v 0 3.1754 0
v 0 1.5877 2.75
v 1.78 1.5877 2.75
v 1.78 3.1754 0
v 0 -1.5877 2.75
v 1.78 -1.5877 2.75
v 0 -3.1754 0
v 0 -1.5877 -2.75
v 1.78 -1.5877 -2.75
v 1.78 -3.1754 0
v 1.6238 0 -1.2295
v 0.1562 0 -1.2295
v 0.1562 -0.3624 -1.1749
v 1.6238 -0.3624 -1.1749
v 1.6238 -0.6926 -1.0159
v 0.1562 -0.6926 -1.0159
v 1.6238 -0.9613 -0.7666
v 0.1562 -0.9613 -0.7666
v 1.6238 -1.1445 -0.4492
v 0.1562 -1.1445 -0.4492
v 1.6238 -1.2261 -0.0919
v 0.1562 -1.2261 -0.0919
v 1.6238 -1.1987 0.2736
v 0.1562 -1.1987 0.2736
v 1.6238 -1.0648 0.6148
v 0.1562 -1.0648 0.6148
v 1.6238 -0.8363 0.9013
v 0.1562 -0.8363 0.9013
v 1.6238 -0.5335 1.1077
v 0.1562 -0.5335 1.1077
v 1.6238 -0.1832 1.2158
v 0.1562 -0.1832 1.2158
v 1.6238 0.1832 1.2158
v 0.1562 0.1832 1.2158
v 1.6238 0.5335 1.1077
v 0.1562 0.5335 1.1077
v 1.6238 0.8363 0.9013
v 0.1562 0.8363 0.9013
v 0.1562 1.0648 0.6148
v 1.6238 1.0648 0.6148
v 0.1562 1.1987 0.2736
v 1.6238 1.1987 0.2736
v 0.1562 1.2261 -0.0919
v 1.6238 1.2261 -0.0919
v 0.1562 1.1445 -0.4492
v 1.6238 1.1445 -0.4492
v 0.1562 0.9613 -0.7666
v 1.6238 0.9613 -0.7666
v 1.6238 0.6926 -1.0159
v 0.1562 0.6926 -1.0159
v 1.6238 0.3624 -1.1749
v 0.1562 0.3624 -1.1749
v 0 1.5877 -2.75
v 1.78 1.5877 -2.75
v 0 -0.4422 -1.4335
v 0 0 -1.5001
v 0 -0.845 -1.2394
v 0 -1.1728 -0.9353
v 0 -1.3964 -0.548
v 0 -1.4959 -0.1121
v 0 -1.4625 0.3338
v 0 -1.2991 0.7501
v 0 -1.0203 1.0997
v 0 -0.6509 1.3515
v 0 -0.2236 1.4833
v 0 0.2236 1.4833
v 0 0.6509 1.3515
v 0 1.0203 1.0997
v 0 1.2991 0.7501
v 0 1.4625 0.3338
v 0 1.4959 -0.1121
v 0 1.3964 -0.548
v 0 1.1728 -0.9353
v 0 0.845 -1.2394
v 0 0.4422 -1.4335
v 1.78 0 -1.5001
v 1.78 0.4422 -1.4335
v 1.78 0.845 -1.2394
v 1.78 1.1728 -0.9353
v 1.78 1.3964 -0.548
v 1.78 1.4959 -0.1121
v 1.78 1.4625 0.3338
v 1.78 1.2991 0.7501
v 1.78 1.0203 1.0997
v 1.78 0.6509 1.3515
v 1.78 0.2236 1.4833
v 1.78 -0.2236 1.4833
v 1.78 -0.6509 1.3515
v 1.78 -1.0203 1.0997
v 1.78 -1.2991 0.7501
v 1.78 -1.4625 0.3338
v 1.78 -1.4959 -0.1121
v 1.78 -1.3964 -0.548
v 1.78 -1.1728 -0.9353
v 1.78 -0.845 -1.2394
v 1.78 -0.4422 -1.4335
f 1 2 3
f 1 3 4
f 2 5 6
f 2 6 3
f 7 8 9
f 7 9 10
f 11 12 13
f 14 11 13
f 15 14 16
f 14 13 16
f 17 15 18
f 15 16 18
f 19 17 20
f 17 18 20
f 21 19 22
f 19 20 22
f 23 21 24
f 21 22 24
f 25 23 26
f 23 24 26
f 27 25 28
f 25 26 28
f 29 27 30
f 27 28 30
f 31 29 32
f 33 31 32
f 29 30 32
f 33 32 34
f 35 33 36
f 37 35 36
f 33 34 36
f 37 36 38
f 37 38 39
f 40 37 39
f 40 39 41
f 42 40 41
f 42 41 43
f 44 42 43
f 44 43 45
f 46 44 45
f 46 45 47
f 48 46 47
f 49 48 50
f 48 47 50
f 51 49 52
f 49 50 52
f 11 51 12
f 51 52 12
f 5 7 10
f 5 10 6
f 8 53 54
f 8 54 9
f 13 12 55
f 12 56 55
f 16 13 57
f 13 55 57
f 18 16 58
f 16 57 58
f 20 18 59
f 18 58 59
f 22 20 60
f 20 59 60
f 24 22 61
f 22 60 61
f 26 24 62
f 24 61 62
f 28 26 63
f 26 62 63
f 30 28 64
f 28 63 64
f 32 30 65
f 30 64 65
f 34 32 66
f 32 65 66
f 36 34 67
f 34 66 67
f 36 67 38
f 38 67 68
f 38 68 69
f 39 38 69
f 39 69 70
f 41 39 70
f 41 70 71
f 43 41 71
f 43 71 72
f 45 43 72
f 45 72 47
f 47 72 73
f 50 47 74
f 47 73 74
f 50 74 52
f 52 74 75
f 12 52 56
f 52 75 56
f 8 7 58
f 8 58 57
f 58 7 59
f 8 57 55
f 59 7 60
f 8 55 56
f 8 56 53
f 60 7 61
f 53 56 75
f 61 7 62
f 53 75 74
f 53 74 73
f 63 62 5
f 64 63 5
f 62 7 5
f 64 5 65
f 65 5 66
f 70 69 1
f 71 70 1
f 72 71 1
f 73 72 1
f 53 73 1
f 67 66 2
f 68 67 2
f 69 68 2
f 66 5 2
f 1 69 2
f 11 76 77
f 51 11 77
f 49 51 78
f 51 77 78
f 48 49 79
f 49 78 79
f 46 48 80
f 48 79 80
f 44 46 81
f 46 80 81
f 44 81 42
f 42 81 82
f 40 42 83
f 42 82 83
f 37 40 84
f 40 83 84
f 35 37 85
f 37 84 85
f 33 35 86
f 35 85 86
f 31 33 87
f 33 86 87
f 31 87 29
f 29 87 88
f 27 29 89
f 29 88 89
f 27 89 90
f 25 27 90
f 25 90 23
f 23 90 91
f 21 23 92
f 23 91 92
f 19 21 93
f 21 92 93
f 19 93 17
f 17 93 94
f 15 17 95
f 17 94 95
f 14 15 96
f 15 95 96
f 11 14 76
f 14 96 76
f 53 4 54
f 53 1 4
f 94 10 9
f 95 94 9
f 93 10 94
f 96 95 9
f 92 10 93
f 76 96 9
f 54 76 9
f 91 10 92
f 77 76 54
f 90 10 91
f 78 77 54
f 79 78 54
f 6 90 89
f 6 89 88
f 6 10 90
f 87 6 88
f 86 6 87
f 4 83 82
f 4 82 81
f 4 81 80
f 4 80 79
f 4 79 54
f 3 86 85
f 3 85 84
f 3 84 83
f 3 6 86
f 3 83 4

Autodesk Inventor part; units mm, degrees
ref_plane "YZ Plane" through (0, 0, 0) normal (1, 0, 0) x (0, 1, 0)
ref_plane "XZ Plane" through (0, 0, 0) normal (0, 1, 0) x (-1, 0, 0)
sketch "Sketch1" plane through (0, 0, 0) normal (1, 0, 0) x (0, 1, 0)
  line L0 (1.5877, -2.75) -> (-1.5877, -2.75)
  line L1 (-1.5877, -2.75) -> (-3.1754, 0)
  line L2 (-3.1754, 0) -> (-1.5877, 2.75)
  line L3 (-1.5877, 2.75) -> (1.5877, 2.75)
  line L4 (1.5877, 2.75) -> (3.1754, 0)
  line L5 (3.1754, 0) -> (1.5877, -2.75)
  point P0 (0, 0)
  point P1 (0, 0)
  dimension "d0" = 6.3509
extrude "Body" add sketch "Sketch1" along normal blind 1.78
sketch "Sketch2" plane through (1.78, 0, 0) normal (1, 0, 0) x (0, 0, -1)
  point P0 (0, 0)
hole "Thread" at (1.78, 0, 0) direction (-1, 0, 0) diameter 2.459 end through all thread size "M3x0.5" class "6H" standard "ISO Metric profile"
chamfer "Chamfer2" distance 0.2706 angle 30 1 edges at (1.78, 0, 1.2295) measured on face at (1.78, -1.925, 1.1495)
chamfer "Chamfer1" distance 0.2706 angle 30 1 edges at (0, 0, 1.2295) measured on face at (0, -1.925, 1.1495)
ref_plane "Work Plane1" through (-6.8079, 0, 0) normal (0, 0, -1) x (1, 0, 0)
equation "\"d0\" = 1.1547 * SW"
equation "\"d1\" = KOH"
equation "\"d12\" = -0.5 * GD1 + 0.5 * NND"
equation "\"d19\" = -0.5 * GD1 + 0.5 * NND"
equation "\"d10\" = -0.5 * GD1 + 0.5 * NND"
equation "\"d18\" = -0.5 * GD1 + 0.5 * NND"
equation "\"NND\" = 3"
equation "\"KOH\" = 1.78"
equation "\"SW\" = 5.5"
equation "\"GUL\" = 0.541266 * PTC"
equation "\"THREADDIA\" = 3"
equation "\"TOA\" = 30deg"
equation "\"PTC\" = 0.5"
equation "\"E0\" = 1.155 * SW"
equation "\"GAL\" = 0.541266 * PTC"
equation "\"GD1\" = 2.458734"
properties part number "AS 1474 - M3" material "Steel, Mild"
